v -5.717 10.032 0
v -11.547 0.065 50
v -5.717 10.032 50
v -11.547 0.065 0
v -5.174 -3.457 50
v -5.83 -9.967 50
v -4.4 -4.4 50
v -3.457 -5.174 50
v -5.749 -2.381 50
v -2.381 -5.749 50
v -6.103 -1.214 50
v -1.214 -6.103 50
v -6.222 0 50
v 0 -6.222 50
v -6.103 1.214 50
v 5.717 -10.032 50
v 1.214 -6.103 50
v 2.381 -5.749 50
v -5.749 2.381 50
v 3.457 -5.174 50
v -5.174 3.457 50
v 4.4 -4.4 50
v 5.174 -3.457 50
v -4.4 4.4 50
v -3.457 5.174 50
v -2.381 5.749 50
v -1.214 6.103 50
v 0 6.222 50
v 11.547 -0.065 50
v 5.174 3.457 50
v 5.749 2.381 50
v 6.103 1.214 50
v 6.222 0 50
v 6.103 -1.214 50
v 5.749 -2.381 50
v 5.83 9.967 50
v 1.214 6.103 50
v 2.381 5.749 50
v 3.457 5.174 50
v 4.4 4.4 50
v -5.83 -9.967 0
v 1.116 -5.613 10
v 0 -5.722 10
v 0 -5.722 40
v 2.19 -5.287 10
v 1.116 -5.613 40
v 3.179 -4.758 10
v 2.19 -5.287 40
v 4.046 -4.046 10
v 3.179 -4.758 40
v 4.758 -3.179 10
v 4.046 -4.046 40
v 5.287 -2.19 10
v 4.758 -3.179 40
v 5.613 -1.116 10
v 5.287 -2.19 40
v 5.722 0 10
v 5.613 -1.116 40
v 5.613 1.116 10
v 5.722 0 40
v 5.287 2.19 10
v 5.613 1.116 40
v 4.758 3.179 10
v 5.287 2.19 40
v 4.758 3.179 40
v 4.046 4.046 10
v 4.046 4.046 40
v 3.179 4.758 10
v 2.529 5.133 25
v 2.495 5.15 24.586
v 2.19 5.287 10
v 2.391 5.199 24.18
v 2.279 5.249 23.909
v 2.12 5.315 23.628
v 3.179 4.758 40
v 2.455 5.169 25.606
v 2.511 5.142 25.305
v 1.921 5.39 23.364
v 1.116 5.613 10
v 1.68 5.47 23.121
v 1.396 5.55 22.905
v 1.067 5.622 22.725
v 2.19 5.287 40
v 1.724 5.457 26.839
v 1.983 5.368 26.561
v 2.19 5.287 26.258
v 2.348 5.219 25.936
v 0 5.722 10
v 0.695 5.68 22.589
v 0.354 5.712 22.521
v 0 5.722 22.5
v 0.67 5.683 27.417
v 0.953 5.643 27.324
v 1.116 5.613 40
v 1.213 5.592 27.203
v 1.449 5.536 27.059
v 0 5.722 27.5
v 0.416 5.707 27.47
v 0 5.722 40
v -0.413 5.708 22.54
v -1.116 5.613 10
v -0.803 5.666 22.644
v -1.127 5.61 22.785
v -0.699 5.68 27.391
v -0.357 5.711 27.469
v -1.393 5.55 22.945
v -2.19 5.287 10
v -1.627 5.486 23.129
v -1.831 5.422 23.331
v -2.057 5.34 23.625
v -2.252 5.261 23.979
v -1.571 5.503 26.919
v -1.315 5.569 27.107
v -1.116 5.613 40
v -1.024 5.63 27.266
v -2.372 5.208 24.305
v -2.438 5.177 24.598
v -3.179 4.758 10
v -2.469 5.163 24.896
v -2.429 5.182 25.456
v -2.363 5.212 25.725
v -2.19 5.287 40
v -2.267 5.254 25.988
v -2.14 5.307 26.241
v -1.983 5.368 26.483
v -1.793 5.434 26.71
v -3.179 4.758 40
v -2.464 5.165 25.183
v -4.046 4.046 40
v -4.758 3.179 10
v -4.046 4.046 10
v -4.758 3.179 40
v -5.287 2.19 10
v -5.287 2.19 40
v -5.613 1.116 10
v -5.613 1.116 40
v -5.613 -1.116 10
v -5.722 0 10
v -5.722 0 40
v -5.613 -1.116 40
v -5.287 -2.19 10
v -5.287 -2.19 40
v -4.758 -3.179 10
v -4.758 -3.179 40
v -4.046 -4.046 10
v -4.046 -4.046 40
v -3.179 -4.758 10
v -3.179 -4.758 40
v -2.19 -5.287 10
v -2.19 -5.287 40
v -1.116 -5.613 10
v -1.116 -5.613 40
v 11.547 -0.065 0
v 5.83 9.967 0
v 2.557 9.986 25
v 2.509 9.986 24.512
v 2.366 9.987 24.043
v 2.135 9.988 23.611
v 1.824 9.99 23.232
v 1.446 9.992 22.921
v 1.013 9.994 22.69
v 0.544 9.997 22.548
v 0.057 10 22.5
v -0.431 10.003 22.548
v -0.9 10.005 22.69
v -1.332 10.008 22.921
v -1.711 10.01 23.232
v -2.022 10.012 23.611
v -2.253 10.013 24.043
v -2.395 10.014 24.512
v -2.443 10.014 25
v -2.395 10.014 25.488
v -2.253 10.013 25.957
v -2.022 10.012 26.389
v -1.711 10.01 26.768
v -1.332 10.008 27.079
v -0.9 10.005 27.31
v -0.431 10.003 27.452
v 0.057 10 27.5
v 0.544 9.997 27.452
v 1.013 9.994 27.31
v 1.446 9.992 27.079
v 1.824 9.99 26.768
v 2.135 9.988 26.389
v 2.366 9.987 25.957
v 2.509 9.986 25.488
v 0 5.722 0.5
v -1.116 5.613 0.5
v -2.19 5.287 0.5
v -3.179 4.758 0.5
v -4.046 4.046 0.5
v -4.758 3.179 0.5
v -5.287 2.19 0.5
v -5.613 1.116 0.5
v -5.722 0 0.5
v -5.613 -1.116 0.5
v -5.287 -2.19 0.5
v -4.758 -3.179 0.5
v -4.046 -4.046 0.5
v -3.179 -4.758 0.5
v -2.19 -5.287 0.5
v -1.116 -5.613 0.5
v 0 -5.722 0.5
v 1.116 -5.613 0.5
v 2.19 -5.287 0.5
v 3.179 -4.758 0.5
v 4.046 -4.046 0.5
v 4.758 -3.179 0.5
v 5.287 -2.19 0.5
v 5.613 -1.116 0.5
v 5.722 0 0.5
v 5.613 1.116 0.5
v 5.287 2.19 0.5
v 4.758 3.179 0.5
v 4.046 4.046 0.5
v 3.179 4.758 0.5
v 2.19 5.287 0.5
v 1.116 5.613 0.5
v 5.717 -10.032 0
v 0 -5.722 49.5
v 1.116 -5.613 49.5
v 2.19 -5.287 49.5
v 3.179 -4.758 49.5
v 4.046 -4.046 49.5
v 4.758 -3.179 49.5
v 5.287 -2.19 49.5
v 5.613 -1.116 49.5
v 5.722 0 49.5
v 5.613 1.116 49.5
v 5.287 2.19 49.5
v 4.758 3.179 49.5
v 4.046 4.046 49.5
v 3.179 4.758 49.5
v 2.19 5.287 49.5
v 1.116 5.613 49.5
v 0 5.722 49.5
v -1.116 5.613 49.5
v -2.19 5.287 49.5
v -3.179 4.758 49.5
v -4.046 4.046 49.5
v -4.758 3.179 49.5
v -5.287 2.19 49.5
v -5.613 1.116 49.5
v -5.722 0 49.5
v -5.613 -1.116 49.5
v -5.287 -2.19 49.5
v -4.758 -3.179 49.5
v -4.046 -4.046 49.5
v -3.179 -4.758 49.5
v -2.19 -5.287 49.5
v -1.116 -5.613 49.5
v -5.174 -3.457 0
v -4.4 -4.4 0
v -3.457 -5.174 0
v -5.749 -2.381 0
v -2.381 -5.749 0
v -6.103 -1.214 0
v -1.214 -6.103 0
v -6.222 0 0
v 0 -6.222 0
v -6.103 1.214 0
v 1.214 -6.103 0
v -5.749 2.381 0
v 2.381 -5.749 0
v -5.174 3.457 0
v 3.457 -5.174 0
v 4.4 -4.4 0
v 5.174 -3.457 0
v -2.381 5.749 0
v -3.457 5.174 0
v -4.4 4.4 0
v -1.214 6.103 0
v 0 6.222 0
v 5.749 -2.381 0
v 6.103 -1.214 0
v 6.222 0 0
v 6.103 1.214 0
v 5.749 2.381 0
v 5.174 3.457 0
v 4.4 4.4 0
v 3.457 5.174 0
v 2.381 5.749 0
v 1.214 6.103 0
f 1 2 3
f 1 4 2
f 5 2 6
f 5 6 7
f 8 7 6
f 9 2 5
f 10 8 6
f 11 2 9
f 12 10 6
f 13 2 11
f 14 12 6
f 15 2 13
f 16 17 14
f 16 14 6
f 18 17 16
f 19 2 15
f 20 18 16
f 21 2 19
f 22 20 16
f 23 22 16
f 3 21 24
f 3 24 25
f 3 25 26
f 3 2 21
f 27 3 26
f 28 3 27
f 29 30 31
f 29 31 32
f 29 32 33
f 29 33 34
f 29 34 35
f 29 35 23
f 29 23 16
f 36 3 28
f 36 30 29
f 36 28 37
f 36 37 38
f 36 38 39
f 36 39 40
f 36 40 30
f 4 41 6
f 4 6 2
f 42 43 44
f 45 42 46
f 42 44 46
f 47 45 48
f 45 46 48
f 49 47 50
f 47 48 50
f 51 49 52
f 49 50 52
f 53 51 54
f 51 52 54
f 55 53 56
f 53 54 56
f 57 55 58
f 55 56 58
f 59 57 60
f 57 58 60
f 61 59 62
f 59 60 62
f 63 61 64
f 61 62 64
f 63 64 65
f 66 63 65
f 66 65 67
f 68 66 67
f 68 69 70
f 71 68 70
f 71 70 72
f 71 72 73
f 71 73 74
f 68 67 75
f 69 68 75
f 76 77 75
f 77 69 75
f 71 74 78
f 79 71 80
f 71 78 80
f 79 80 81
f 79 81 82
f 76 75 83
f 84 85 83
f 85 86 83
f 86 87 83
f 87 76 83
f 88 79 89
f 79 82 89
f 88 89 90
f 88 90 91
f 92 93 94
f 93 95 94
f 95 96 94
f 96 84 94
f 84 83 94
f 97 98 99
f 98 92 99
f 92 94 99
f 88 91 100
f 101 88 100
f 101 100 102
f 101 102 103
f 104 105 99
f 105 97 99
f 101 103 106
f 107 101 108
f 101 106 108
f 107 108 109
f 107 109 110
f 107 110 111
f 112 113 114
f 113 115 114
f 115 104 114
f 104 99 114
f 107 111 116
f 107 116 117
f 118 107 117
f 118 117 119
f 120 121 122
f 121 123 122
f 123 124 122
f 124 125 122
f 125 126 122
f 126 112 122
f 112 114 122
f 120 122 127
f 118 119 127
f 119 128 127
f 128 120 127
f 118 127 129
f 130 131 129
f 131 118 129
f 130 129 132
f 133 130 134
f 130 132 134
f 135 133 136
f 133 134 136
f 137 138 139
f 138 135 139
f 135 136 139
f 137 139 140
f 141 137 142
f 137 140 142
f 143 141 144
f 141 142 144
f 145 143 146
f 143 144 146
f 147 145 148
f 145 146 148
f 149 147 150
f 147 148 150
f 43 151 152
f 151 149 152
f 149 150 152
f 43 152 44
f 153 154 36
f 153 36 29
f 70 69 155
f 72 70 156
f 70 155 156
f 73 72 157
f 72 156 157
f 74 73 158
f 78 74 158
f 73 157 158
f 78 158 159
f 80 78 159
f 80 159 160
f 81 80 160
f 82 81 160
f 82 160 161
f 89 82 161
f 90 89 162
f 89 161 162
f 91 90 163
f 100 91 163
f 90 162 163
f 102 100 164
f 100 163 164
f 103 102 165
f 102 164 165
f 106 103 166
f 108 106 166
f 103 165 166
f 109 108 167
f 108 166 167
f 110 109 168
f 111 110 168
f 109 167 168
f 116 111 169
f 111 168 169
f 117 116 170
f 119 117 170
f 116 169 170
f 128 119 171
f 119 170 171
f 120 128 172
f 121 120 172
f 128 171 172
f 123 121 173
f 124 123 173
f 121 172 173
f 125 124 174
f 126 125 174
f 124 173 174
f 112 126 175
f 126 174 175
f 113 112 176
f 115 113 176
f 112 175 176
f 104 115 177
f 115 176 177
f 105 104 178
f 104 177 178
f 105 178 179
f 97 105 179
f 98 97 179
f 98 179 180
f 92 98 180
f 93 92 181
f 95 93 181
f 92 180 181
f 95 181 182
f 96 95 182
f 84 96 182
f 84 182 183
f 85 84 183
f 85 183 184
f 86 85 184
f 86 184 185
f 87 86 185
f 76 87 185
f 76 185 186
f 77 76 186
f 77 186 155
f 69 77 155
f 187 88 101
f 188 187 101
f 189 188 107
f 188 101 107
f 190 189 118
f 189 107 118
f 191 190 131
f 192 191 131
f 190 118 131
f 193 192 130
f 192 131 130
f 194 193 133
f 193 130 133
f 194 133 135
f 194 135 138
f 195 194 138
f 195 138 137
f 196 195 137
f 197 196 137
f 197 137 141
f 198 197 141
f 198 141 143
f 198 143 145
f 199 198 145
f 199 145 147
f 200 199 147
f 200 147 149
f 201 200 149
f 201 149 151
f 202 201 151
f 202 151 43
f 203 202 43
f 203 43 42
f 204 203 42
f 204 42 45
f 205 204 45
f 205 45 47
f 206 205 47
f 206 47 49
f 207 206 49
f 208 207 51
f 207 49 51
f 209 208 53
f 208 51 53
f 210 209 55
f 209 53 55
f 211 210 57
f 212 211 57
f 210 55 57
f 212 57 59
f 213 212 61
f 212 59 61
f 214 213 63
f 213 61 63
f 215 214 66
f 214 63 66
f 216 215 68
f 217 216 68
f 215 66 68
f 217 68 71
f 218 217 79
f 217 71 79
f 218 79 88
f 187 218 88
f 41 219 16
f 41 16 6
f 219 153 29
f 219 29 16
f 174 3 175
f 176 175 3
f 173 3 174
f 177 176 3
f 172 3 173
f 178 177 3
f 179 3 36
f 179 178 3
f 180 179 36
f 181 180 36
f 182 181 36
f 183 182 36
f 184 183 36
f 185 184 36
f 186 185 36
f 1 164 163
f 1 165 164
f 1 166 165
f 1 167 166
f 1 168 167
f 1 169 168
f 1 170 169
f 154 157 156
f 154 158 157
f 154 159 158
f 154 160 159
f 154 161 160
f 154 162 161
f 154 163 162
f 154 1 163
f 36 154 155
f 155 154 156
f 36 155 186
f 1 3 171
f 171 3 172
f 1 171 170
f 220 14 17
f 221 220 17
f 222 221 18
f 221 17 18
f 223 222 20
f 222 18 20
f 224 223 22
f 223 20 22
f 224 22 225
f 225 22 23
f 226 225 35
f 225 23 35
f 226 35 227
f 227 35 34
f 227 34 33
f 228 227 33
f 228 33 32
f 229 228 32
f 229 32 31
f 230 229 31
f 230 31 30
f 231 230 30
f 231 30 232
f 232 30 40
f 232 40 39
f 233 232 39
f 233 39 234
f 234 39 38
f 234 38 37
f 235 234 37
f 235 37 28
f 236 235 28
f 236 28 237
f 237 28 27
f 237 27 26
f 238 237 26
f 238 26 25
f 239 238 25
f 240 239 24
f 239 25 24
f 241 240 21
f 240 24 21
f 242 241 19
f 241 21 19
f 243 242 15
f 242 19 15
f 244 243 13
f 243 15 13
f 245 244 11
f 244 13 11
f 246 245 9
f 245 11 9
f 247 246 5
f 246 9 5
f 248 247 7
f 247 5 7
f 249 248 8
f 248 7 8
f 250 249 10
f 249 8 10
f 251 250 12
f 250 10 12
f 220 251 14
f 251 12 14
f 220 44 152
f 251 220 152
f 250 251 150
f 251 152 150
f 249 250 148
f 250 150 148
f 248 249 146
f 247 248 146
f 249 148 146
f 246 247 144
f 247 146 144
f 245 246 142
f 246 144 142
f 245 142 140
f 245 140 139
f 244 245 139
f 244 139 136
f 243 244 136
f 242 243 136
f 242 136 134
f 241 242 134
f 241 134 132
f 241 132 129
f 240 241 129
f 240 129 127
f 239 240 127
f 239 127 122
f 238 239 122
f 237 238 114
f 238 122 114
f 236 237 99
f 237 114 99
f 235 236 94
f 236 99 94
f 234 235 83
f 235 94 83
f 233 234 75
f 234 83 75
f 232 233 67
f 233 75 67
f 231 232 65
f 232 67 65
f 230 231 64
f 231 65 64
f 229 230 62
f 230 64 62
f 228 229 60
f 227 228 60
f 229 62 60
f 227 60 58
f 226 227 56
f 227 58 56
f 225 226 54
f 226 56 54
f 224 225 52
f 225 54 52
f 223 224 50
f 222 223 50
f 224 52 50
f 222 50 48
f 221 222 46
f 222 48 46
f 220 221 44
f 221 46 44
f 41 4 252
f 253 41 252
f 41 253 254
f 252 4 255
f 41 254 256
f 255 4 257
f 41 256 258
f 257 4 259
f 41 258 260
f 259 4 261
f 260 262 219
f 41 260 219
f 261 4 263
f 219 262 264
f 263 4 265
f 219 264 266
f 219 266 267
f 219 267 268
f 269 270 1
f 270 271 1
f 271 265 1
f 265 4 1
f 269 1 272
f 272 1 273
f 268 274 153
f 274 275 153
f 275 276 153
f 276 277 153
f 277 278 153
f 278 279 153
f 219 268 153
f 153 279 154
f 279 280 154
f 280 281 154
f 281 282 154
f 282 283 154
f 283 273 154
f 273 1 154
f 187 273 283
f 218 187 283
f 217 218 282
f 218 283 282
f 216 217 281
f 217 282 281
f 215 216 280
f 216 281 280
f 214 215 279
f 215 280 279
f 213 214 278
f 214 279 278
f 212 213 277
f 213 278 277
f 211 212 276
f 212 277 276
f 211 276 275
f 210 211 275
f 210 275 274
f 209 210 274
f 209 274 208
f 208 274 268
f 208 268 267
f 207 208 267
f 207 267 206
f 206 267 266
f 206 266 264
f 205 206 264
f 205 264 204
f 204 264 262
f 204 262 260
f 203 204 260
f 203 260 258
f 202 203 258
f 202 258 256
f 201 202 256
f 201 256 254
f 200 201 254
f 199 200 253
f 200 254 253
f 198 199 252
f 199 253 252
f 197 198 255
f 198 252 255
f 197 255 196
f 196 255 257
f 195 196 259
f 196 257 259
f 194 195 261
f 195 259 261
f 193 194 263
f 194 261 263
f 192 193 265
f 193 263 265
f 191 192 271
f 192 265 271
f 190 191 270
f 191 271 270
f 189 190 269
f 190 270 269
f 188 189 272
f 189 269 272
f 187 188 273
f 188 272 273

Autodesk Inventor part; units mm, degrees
ref_plane "YZ Plane" through (0, 0, 0) normal (1, 0, 0) x (0, 1, 0)
ref_plane "XZ Plane" through (0, 0, 0) normal (0, 1, 0) x (-1, 0, 0)
ref_plane "XY Plane" through (0, 0, 0) normal (0, 0, 1) x (1, 0, 0)
sketch "Skizze1" plane through (0, 0, 0) normal (0, 0, 1) x (1, 0, 0)
  line L0 (-16.1655, 0) -> (16.1655, 0) projected
  line L1 (0, -14.0455) -> (0, 14.0455) projected
  line L2 (-5.7168, 10.0325) -> (5.83, 9.9672)
  line L3 (5.83, 9.9672) -> (11.5468, -0.0653)
  line L4 (11.5468, -0.0653) -> (5.7168, -10.0325)
  line L5 (5.7168, -10.0325) -> (-5.83, -9.9672)
  line L6 (-5.83, -9.9672) -> (-11.5468, 0.0653)
  line L7 (-11.5468, 0.0653) -> (-5.7168, 10.0325)
  point P0 (0, 0)
  point P1 (0, 0)
  dimension "d0" = 20
extrude "Extrusion1" add sketch "Skizze1" along normal blind 50
sketch "Skizze2" plane through (-5.7168, 10.0325, 50) normal (0.0056567, 0.999984, 0) x (0.999984, -0.0056567, 0)
  line L0 (11.547, 0) -> (0, 0) projected
  circle A0 centre (5.7735, 25) radius 2.5
  point P0 (5.7735, 50)
  dimension "d3" = 25
  dimension "d4" = 5
extrude "Extrusion2" cut sketch "Skizze2" against normal blind 10
sketch "Skizze3" plane through (0, 0, 0) normal (0, 0, -1) x (-1, 0, 0)
  point P0 (0, 0)
hole "Bohrung1" at (0, 0, 0) direction (0, 0, 1) diameter 11.445 depth 40 thread size "G13.157x1.337" designation "G 1/4" standard "ISO Pipe Threads"
sketch "Skizze4" plane through (0, 0, 50) normal (0, 0, 1) x (1, 0, 0)
  point P0 (0, 0)
hole "Bohrung2" at (0, 0, 50) direction (0, 0, -1) diameter 11.445 depth 40 thread size "G13.157x1.337" designation "G 1/4" standard "ISO Pipe Threads"
chamfer "Fase1" distance 0.5 angle 45 1 edges at (0, -5.7225, 0)
chamfer "Fase2" distance 0.5 angle 45 1 edges at (0, 5.7225, 50)
sketch "Skizze5" plane through (0, 0, 50) normal (0, 0, 1) x (1, 0, 0)
  point P0 (0, 0)
properties part number "Luftregler1"
